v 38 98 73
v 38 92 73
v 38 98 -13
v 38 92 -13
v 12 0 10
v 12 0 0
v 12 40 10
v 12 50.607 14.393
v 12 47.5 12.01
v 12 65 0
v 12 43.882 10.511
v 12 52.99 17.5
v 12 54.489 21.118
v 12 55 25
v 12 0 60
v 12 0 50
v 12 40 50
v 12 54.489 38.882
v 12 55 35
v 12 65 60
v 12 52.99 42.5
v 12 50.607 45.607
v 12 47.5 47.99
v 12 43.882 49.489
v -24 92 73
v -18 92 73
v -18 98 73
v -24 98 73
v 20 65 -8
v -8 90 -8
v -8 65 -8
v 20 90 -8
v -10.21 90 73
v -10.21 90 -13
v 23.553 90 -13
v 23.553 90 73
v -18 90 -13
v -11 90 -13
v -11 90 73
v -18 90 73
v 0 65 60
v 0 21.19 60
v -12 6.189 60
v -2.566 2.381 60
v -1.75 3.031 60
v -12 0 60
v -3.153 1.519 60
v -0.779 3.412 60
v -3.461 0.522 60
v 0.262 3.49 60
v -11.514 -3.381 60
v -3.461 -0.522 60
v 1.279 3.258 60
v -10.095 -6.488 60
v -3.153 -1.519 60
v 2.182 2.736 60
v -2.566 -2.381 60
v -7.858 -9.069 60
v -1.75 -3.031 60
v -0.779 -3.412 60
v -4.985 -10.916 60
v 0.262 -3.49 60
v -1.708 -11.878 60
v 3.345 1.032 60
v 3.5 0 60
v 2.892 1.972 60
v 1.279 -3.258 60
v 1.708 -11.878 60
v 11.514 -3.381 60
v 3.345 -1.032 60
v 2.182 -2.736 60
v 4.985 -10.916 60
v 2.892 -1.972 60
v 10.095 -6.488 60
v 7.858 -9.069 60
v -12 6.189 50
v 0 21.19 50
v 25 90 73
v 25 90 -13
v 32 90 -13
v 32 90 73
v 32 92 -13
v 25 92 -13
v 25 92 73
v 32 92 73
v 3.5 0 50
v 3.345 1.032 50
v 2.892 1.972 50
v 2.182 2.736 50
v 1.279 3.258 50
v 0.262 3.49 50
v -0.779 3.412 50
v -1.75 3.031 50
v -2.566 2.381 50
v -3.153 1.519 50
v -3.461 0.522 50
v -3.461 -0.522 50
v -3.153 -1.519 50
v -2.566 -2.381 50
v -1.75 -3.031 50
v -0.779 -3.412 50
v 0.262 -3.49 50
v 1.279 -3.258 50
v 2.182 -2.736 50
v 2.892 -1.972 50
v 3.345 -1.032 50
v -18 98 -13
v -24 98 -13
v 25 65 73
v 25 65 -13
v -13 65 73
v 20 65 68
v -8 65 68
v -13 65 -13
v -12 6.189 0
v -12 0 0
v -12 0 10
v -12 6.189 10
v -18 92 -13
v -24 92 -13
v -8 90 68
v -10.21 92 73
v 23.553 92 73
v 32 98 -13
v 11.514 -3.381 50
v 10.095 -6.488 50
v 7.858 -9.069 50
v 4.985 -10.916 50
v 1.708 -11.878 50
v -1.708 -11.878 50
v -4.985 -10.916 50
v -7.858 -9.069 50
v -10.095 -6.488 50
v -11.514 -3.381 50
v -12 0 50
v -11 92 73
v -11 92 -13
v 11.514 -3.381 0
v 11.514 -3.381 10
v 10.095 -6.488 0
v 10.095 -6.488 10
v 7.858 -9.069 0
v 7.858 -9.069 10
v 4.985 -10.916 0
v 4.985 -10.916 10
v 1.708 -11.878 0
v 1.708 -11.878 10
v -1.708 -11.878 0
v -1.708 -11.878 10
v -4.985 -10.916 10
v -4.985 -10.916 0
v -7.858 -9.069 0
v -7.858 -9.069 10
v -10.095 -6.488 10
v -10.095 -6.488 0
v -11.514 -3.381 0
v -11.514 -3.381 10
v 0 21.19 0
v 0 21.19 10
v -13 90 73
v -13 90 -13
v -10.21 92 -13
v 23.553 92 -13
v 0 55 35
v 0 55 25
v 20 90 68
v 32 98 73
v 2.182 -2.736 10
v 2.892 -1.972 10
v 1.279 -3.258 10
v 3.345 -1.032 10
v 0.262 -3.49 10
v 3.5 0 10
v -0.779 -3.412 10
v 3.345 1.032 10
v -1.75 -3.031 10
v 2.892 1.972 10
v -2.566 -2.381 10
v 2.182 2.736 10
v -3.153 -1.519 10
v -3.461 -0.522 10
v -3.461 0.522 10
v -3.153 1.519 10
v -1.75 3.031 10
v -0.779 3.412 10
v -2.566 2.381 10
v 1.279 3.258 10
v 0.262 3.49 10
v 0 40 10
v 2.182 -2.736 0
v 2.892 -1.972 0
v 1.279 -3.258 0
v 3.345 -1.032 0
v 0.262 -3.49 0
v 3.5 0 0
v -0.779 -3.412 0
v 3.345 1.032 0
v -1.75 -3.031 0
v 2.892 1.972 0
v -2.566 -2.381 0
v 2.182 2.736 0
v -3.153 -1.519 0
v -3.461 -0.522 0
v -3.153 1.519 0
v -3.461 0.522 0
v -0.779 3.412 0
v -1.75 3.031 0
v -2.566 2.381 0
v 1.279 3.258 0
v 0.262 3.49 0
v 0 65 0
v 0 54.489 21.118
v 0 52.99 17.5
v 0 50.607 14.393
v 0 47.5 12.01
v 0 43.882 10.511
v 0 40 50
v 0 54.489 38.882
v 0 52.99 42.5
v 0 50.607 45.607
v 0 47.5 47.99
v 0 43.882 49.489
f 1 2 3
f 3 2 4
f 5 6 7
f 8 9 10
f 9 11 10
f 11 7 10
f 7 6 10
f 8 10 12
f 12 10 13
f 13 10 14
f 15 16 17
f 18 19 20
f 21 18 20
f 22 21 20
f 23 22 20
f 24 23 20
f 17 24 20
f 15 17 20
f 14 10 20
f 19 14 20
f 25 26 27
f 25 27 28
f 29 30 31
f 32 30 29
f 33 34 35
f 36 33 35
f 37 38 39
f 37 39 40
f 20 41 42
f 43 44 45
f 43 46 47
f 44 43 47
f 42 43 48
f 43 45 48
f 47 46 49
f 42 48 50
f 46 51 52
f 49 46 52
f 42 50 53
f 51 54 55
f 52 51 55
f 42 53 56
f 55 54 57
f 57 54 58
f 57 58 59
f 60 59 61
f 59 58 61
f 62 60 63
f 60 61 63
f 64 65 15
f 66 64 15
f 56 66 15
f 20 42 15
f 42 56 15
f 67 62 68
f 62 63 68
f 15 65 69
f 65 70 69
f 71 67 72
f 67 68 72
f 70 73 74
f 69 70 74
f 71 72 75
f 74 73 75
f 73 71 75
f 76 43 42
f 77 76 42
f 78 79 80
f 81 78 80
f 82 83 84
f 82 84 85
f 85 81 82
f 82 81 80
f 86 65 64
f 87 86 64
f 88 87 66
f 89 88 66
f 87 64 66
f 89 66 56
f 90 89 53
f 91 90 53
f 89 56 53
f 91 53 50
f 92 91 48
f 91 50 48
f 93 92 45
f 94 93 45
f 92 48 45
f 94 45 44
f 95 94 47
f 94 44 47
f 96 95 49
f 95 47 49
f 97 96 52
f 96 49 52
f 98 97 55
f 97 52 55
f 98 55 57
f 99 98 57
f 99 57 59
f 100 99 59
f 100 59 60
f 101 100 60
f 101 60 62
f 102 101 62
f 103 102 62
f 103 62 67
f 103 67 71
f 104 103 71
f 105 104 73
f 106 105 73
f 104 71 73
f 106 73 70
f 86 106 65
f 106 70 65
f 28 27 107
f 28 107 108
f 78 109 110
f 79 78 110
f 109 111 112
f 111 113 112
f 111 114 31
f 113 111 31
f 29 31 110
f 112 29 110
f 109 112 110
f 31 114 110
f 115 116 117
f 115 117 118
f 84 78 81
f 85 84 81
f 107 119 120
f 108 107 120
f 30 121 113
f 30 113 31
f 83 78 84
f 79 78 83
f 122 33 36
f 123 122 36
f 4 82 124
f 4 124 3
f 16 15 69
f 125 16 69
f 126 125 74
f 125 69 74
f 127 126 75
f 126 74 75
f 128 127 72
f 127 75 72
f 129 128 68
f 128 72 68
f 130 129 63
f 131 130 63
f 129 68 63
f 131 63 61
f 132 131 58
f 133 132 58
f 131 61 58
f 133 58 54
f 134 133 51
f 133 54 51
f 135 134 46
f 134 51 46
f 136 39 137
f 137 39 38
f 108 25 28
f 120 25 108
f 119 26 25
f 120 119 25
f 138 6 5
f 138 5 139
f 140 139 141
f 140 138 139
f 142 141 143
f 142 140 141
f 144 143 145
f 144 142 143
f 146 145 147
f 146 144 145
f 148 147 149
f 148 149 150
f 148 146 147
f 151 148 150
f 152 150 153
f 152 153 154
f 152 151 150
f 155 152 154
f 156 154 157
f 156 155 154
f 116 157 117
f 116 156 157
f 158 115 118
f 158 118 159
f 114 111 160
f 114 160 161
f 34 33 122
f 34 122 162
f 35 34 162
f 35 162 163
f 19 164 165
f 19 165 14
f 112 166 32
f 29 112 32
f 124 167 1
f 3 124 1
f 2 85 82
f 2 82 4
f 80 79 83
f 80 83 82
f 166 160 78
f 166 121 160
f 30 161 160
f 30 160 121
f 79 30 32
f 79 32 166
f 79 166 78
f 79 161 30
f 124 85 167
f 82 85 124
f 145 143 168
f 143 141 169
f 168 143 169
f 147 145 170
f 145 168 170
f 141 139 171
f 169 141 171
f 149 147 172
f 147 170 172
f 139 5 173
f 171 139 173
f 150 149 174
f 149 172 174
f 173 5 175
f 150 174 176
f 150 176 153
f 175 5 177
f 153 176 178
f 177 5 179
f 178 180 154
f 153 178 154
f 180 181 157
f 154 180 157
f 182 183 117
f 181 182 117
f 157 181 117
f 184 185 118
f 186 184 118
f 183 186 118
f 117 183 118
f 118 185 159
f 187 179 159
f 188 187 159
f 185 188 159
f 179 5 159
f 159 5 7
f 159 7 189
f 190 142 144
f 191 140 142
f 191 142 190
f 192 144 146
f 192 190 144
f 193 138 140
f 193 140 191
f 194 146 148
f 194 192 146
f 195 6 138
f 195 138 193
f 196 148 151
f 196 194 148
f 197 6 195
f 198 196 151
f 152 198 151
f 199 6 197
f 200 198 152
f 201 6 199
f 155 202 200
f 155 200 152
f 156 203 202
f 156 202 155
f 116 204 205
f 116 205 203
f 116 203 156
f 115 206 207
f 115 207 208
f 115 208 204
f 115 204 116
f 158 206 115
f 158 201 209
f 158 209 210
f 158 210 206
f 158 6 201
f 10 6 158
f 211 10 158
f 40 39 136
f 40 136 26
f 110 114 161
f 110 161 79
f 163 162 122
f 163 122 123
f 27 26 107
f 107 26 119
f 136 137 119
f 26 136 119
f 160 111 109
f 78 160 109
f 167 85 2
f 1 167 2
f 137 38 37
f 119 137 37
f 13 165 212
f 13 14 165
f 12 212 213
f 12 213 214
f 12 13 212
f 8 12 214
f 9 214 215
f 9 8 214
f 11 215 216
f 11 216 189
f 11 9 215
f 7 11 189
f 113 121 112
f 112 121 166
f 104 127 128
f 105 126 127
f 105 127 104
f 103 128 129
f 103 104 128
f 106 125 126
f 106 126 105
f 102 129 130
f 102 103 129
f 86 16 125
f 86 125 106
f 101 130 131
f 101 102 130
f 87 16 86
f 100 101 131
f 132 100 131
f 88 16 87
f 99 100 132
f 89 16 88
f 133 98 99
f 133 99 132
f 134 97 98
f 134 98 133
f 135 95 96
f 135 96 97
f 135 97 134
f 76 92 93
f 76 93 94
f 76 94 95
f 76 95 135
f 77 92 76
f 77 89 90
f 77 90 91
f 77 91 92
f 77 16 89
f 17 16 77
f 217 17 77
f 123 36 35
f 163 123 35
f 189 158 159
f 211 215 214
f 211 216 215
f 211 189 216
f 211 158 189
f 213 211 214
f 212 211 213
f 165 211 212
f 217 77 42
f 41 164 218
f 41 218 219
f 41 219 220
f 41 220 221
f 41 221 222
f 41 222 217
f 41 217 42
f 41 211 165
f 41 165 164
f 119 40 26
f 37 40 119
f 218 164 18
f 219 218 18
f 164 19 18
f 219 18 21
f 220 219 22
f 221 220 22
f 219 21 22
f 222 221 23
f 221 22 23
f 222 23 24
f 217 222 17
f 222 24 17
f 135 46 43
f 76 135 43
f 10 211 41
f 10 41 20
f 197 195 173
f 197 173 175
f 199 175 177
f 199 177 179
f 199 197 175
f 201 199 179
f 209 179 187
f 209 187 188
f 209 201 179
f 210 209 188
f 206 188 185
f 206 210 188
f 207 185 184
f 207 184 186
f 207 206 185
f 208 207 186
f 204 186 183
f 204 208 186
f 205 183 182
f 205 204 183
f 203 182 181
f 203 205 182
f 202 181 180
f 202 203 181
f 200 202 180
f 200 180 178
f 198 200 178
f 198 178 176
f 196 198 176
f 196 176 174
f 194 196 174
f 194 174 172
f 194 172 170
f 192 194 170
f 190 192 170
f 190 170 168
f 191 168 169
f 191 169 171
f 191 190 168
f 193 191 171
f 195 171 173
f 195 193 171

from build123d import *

# Parameters (mm, degrees)
ESQUISSE1_R             = 3.5
BOSS_EXTRU_1_DEPTH      = 10
BOSS_EXTRU_2_DEPTH      = 5
ESQUISSE3_W             = 12
ESQUISSE3_H             = 40
BOSS_EXTRU_3_DEPTH      = 5
CONG_1_R                = 15
ESQUISSE4_W             = 38
ESQUISSE4_H             = 86
BOSS_EXTRU_4_DEPTH      = 25
ESQUISSE5_W             = 28
ESQUISSE5_H             = 76
ENL_V_MAT_EXTRU_1_DEPTH = 25
ESQUISSE7_W             = 7
ESQUISSE7_H             = 86
BOSS_EXTRU_6_DEPTH      = 2
ESQUISSE8_W             = 6
ESQUISSE8_H             = 86
BOSS_EXTRU_7_DEPTH      = 6
ESQUISSE11_W            = 33.762776186
ESQUISSE11_H            = 85.999999968
BOSS_EXTRU_10_DEPTH     = 2


with BuildPart() as part:
    # Esquisse1 → Boss.-Extru.1 (new body)
    with BuildSketch(Plane.XY):
        with BuildLine():
            Line((-12, 0), (-12, 6.188999999))
            Line((-12, 6.188999999), (0, 21.189735812))
            Line((0, 21.189735812), (0, 60))
            Line((0, 60), (12, 60))
            Line((12, 60), (12, 0))
            ThreePointArc((12, 0), (0, -12), (-12, 0))
        make_face()
        Circle(ESQUISSE1_R, mode=Mode.SUBTRACT)
    extrude(amount=BOSS_EXTRU_1_DEPTH)


with BuildPart() as body_2:
    # Esquisse2 → Boss.-Extru.2 (new body)
    with BuildSketch(Plane(origin=(0, 60, 0), x_dir=(1, 0, 0), z_dir=(0, 1, 0))):
        Polygon((0, -10), (0, -60), (12, -60), (12, -10), (12, 0), (0, 0), align=None)
    extrude(amount=BOSS_EXTRU_2_DEPTH)


with BuildPart() as body_3:
    # Symétrie2: mirrored copy
    add(part.part.mirror(Plane.XY.offset(30)))

    # Combiner1: union body 2, part
    add(body_2.part)
    add(part.part)

    # Esquisse3 → Boss.-Extru.3 (add)
    with BuildSketch(Plane.XZ.offset(-60)):
        with Locations((6, 30)):
            Rectangle(ESQUISSE3_W, ESQUISSE3_H)
    extrude(amount=BOSS_EXTRU_3_DEPTH)

    # Congé1
    cong_1_edges = [body_3.edges().sort_by_distance(p)[0] for p in [
        (6, 55, 10),
        (6, 55, 50),
    ]]
    fillet(cong_1_edges, radius=CONG_1_R)

    # Esquisse4 → Boss.-Extru.4 (add)
    with BuildSketch(Plane(origin=(0, 65, 0), x_dir=(1, 0, 0), z_dir=(0, 1, 0))):
        with Locations((6, -30)):
            Rectangle(ESQUISSE4_W, ESQUISSE4_H)
    extrude(amount=BOSS_EXTRU_4_DEPTH)

    # Esquisse5 → Enlèv. mat.-Extru.1 (cut)
    with BuildSketch(Plane(origin=(0, 90, 0), x_dir=(1, 0, 0), z_dir=(0, 1, 0))):
        with Locations((6, -30)):
            Rectangle(ESQUISSE5_W, ESQUISSE5_H)
    extrude(amount=-ENL_V_MAT_EXTRU_1_DEPTH, mode=Mode.SUBTRACT)


with BuildPart() as enl_v_mat_extru_1_piece_1:
    # of the separate pieces the step leaves, piece 1, a body of its own (enl_v_mat_extru_1_pieces)
    add(body_3.part.solids().sort_by_distance((12, 65, 0))[0])


with BuildPart() as enl_v_mat_extru_1_piece_2:
    # of the separate pieces the step leaves, piece 2, a body of its own (enl_v_mat_extru_1_pieces)
    add(body_3.part.solids().sort_by_distance((25, 65, 73))[0])


with BuildPart() as body_3_2:
    # Esquisse7 → Boss.-Extru.6 (new body)
    with BuildSketch(Plane(origin=(0, 90, 0), x_dir=(1, 0, 0), z_dir=(0, 1, 0))):
        with Locations((28.5, -30)):
            Rectangle(ESQUISSE7_W, ESQUISSE7_H)
    extrude(amount=BOSS_EXTRU_6_DEPTH)


with BuildPart() as body_4:
    # Esquisse8 → Boss.-Extru.7 (new body)
    with BuildSketch(Plane(origin=(0, 92, 0), x_dir=(1, 0, 0), z_dir=(0, 1, 0))):
        with Locations((35, -30)):
            Rectangle(ESQUISSE8_W, ESQUISSE8_H)
    extrude(amount=BOSS_EXTRU_7_DEPTH)


with BuildPart() as body_5:
    # Symétrie4: mirrored copy
    add(body_3_2.part.mirror(Plane.ZY.offset(-7)))


with BuildPart() as body_6:
    # Sym_trie4 2: mirrored copy
    add(body_4.part.mirror(Plane.ZY.offset(-7)))


with BuildPart() as body_7:
    # Esquisse11 → Boss.-Extru.10 (new body)
    with BuildSketch(Plane(origin=(0, 90, 0), x_dir=(1, 0, 0), z_dir=(0, 1, 0))):
        with Locations((6.67114179, -30)):
            Rectangle(ESQUISSE11_W, ESQUISSE11_H)
    extrude(amount=BOSS_EXTRU_10_DEPTH)


solid = Compound([enl_v_mat_extru_1_piece_1.part, enl_v_mat_extru_1_piece_2.part, body_3_2.part, body_4.part, body_5.part, body_6.part, body_7.part])
